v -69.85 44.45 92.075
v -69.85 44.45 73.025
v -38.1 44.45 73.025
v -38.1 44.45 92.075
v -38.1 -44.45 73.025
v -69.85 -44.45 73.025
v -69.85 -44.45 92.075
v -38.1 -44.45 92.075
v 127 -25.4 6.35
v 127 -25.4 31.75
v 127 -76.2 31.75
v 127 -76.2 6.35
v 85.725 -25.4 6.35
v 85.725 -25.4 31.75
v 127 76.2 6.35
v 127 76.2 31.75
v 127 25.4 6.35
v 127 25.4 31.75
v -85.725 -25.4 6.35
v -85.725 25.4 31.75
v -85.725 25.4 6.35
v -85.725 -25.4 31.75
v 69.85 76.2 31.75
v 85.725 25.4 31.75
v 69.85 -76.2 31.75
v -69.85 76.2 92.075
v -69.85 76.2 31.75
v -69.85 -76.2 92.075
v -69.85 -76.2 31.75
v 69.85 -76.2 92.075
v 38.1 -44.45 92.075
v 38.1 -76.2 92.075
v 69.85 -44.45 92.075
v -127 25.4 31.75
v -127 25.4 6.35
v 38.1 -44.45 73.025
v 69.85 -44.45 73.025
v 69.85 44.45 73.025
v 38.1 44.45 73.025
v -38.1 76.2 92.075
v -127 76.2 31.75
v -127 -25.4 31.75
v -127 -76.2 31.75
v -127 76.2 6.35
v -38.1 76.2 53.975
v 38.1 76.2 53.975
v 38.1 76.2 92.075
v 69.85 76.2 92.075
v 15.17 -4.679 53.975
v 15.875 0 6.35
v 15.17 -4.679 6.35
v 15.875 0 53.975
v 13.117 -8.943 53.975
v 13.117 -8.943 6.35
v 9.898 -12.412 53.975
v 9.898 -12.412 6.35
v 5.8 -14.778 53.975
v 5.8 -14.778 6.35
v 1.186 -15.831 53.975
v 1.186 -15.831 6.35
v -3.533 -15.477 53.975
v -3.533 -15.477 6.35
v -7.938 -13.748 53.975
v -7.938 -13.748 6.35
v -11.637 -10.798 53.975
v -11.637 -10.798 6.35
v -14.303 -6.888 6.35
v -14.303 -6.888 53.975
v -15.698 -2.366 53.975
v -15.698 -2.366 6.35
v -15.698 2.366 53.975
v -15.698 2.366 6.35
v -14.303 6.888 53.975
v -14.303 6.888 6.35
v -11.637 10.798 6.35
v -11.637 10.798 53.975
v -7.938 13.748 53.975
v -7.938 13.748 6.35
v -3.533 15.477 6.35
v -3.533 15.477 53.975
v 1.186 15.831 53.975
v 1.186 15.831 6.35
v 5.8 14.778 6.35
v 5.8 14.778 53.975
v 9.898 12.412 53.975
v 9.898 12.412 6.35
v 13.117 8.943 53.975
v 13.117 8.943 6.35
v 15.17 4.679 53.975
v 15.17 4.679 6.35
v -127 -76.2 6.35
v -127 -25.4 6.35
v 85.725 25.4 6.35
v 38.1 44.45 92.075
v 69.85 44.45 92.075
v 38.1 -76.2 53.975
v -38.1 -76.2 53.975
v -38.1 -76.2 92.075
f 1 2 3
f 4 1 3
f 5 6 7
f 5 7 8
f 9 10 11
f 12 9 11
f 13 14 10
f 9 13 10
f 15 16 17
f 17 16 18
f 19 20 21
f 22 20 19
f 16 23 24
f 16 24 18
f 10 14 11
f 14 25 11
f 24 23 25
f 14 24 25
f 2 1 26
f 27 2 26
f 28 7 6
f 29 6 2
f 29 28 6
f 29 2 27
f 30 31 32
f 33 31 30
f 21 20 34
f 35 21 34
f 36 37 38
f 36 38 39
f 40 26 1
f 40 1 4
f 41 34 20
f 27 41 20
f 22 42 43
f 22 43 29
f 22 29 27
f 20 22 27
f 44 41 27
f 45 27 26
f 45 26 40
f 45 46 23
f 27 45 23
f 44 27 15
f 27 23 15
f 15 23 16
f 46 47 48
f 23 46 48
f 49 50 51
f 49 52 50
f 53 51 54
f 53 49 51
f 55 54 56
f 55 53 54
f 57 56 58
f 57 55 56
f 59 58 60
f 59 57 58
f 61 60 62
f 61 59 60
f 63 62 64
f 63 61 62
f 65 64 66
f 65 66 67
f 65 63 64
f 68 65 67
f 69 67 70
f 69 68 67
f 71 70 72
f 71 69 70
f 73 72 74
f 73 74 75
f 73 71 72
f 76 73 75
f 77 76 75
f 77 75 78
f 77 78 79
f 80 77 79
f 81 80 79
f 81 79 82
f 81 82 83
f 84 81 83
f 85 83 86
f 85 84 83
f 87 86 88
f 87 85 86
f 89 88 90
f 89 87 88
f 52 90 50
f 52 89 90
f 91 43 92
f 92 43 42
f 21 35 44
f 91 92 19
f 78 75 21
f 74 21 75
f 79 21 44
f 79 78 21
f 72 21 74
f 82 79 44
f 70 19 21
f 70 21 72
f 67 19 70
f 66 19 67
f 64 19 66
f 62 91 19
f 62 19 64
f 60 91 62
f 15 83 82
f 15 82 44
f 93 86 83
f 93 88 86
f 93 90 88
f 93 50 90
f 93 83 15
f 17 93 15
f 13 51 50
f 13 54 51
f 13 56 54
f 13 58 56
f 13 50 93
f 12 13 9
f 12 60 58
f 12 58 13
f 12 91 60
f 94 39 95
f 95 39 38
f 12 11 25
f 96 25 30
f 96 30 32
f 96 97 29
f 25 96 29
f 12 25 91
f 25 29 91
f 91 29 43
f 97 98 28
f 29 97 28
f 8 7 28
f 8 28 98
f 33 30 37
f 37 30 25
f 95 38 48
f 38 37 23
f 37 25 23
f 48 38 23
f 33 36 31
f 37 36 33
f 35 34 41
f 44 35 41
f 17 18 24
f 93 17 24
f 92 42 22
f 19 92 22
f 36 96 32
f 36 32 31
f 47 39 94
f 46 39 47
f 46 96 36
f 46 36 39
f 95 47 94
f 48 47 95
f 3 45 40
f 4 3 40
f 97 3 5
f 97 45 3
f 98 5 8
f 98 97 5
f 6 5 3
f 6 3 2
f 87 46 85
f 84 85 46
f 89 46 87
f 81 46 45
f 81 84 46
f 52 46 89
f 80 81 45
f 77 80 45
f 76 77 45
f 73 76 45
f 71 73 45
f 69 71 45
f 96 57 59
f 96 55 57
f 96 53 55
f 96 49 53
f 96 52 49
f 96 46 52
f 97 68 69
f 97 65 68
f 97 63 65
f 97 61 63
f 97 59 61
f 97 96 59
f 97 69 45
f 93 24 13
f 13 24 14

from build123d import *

# Parameters (mm, degrees)
F1_DEPTH = 76.2
F2_W     = 31.75
F2_H     = 31.75
F3_DEPTH = 19.05
F4_R     = 15.875
F5_DEPTH = 25.4
F6_W     = 171.45
F6_H     = 50.8
F6_R     = 15.875
F7_DEPTH = 25.4


with BuildPart() as f1:
    # F0 (on Front) → F1 (new body, symmetric)
    with BuildSketch(Plane.XZ):
        Polygon((38.1, 53.975), (-38.1, 53.975), (-38.1, 73.025), (-69.85, 73.025), (-69.85, 53.975), (-69.85, 31.75), (69.85, 31.75), (69.85, 53.975), (69.85, 73.025), (38.1, 73.025), align=None)
    extrude(amount=F1_DEPTH, both=True)

    # F2 (on face) → F3 (join)
    with BuildSketch(Plane.XY.offset(73.025)):
        with Locations((53.975, 60.325)):
            Rectangle(F2_W, F2_H)
        with Locations((53.975, -60.325)):
            Rectangle(F2_W, F2_H)
        with Locations((-53.975, 60.325)):
            Rectangle(F2_W, F2_H)
        with Locations((-53.975, -60.325)):
            Rectangle(F2_W, F2_H)
    extrude(amount=F3_DEPTH)

    # F4 (on face) → F5 (cut)
    with BuildSketch(Plane.XY.offset(53.975)):
        Circle(F4_R)
    extrude(amount=-F5_DEPTH, mode=Mode.SUBTRACT)

    # F6 (on face) → F7 (join)
    with BuildSketch(Plane(origin=(0, 0, 31.75), x_dir=(1, 0, 0), z_dir=(0, 0, -1))):
        Polygon((127, 76.2), (-127, 76.2), (-127, 25.4), (-85.725, 25.4), (85.725, 25.4), (127, 25.4), align=None)
        Rectangle(F6_W, F6_H)
        Circle(F6_R, mode=Mode.SUBTRACT)
        Polygon((85.725, -25.4), (-85.725, -25.4), (-127, -25.4), (-127, -76.2), (127, -76.2), (127, -25.4), align=None)
    extrude(amount=F7_DEPTH)


solid = f1.part
